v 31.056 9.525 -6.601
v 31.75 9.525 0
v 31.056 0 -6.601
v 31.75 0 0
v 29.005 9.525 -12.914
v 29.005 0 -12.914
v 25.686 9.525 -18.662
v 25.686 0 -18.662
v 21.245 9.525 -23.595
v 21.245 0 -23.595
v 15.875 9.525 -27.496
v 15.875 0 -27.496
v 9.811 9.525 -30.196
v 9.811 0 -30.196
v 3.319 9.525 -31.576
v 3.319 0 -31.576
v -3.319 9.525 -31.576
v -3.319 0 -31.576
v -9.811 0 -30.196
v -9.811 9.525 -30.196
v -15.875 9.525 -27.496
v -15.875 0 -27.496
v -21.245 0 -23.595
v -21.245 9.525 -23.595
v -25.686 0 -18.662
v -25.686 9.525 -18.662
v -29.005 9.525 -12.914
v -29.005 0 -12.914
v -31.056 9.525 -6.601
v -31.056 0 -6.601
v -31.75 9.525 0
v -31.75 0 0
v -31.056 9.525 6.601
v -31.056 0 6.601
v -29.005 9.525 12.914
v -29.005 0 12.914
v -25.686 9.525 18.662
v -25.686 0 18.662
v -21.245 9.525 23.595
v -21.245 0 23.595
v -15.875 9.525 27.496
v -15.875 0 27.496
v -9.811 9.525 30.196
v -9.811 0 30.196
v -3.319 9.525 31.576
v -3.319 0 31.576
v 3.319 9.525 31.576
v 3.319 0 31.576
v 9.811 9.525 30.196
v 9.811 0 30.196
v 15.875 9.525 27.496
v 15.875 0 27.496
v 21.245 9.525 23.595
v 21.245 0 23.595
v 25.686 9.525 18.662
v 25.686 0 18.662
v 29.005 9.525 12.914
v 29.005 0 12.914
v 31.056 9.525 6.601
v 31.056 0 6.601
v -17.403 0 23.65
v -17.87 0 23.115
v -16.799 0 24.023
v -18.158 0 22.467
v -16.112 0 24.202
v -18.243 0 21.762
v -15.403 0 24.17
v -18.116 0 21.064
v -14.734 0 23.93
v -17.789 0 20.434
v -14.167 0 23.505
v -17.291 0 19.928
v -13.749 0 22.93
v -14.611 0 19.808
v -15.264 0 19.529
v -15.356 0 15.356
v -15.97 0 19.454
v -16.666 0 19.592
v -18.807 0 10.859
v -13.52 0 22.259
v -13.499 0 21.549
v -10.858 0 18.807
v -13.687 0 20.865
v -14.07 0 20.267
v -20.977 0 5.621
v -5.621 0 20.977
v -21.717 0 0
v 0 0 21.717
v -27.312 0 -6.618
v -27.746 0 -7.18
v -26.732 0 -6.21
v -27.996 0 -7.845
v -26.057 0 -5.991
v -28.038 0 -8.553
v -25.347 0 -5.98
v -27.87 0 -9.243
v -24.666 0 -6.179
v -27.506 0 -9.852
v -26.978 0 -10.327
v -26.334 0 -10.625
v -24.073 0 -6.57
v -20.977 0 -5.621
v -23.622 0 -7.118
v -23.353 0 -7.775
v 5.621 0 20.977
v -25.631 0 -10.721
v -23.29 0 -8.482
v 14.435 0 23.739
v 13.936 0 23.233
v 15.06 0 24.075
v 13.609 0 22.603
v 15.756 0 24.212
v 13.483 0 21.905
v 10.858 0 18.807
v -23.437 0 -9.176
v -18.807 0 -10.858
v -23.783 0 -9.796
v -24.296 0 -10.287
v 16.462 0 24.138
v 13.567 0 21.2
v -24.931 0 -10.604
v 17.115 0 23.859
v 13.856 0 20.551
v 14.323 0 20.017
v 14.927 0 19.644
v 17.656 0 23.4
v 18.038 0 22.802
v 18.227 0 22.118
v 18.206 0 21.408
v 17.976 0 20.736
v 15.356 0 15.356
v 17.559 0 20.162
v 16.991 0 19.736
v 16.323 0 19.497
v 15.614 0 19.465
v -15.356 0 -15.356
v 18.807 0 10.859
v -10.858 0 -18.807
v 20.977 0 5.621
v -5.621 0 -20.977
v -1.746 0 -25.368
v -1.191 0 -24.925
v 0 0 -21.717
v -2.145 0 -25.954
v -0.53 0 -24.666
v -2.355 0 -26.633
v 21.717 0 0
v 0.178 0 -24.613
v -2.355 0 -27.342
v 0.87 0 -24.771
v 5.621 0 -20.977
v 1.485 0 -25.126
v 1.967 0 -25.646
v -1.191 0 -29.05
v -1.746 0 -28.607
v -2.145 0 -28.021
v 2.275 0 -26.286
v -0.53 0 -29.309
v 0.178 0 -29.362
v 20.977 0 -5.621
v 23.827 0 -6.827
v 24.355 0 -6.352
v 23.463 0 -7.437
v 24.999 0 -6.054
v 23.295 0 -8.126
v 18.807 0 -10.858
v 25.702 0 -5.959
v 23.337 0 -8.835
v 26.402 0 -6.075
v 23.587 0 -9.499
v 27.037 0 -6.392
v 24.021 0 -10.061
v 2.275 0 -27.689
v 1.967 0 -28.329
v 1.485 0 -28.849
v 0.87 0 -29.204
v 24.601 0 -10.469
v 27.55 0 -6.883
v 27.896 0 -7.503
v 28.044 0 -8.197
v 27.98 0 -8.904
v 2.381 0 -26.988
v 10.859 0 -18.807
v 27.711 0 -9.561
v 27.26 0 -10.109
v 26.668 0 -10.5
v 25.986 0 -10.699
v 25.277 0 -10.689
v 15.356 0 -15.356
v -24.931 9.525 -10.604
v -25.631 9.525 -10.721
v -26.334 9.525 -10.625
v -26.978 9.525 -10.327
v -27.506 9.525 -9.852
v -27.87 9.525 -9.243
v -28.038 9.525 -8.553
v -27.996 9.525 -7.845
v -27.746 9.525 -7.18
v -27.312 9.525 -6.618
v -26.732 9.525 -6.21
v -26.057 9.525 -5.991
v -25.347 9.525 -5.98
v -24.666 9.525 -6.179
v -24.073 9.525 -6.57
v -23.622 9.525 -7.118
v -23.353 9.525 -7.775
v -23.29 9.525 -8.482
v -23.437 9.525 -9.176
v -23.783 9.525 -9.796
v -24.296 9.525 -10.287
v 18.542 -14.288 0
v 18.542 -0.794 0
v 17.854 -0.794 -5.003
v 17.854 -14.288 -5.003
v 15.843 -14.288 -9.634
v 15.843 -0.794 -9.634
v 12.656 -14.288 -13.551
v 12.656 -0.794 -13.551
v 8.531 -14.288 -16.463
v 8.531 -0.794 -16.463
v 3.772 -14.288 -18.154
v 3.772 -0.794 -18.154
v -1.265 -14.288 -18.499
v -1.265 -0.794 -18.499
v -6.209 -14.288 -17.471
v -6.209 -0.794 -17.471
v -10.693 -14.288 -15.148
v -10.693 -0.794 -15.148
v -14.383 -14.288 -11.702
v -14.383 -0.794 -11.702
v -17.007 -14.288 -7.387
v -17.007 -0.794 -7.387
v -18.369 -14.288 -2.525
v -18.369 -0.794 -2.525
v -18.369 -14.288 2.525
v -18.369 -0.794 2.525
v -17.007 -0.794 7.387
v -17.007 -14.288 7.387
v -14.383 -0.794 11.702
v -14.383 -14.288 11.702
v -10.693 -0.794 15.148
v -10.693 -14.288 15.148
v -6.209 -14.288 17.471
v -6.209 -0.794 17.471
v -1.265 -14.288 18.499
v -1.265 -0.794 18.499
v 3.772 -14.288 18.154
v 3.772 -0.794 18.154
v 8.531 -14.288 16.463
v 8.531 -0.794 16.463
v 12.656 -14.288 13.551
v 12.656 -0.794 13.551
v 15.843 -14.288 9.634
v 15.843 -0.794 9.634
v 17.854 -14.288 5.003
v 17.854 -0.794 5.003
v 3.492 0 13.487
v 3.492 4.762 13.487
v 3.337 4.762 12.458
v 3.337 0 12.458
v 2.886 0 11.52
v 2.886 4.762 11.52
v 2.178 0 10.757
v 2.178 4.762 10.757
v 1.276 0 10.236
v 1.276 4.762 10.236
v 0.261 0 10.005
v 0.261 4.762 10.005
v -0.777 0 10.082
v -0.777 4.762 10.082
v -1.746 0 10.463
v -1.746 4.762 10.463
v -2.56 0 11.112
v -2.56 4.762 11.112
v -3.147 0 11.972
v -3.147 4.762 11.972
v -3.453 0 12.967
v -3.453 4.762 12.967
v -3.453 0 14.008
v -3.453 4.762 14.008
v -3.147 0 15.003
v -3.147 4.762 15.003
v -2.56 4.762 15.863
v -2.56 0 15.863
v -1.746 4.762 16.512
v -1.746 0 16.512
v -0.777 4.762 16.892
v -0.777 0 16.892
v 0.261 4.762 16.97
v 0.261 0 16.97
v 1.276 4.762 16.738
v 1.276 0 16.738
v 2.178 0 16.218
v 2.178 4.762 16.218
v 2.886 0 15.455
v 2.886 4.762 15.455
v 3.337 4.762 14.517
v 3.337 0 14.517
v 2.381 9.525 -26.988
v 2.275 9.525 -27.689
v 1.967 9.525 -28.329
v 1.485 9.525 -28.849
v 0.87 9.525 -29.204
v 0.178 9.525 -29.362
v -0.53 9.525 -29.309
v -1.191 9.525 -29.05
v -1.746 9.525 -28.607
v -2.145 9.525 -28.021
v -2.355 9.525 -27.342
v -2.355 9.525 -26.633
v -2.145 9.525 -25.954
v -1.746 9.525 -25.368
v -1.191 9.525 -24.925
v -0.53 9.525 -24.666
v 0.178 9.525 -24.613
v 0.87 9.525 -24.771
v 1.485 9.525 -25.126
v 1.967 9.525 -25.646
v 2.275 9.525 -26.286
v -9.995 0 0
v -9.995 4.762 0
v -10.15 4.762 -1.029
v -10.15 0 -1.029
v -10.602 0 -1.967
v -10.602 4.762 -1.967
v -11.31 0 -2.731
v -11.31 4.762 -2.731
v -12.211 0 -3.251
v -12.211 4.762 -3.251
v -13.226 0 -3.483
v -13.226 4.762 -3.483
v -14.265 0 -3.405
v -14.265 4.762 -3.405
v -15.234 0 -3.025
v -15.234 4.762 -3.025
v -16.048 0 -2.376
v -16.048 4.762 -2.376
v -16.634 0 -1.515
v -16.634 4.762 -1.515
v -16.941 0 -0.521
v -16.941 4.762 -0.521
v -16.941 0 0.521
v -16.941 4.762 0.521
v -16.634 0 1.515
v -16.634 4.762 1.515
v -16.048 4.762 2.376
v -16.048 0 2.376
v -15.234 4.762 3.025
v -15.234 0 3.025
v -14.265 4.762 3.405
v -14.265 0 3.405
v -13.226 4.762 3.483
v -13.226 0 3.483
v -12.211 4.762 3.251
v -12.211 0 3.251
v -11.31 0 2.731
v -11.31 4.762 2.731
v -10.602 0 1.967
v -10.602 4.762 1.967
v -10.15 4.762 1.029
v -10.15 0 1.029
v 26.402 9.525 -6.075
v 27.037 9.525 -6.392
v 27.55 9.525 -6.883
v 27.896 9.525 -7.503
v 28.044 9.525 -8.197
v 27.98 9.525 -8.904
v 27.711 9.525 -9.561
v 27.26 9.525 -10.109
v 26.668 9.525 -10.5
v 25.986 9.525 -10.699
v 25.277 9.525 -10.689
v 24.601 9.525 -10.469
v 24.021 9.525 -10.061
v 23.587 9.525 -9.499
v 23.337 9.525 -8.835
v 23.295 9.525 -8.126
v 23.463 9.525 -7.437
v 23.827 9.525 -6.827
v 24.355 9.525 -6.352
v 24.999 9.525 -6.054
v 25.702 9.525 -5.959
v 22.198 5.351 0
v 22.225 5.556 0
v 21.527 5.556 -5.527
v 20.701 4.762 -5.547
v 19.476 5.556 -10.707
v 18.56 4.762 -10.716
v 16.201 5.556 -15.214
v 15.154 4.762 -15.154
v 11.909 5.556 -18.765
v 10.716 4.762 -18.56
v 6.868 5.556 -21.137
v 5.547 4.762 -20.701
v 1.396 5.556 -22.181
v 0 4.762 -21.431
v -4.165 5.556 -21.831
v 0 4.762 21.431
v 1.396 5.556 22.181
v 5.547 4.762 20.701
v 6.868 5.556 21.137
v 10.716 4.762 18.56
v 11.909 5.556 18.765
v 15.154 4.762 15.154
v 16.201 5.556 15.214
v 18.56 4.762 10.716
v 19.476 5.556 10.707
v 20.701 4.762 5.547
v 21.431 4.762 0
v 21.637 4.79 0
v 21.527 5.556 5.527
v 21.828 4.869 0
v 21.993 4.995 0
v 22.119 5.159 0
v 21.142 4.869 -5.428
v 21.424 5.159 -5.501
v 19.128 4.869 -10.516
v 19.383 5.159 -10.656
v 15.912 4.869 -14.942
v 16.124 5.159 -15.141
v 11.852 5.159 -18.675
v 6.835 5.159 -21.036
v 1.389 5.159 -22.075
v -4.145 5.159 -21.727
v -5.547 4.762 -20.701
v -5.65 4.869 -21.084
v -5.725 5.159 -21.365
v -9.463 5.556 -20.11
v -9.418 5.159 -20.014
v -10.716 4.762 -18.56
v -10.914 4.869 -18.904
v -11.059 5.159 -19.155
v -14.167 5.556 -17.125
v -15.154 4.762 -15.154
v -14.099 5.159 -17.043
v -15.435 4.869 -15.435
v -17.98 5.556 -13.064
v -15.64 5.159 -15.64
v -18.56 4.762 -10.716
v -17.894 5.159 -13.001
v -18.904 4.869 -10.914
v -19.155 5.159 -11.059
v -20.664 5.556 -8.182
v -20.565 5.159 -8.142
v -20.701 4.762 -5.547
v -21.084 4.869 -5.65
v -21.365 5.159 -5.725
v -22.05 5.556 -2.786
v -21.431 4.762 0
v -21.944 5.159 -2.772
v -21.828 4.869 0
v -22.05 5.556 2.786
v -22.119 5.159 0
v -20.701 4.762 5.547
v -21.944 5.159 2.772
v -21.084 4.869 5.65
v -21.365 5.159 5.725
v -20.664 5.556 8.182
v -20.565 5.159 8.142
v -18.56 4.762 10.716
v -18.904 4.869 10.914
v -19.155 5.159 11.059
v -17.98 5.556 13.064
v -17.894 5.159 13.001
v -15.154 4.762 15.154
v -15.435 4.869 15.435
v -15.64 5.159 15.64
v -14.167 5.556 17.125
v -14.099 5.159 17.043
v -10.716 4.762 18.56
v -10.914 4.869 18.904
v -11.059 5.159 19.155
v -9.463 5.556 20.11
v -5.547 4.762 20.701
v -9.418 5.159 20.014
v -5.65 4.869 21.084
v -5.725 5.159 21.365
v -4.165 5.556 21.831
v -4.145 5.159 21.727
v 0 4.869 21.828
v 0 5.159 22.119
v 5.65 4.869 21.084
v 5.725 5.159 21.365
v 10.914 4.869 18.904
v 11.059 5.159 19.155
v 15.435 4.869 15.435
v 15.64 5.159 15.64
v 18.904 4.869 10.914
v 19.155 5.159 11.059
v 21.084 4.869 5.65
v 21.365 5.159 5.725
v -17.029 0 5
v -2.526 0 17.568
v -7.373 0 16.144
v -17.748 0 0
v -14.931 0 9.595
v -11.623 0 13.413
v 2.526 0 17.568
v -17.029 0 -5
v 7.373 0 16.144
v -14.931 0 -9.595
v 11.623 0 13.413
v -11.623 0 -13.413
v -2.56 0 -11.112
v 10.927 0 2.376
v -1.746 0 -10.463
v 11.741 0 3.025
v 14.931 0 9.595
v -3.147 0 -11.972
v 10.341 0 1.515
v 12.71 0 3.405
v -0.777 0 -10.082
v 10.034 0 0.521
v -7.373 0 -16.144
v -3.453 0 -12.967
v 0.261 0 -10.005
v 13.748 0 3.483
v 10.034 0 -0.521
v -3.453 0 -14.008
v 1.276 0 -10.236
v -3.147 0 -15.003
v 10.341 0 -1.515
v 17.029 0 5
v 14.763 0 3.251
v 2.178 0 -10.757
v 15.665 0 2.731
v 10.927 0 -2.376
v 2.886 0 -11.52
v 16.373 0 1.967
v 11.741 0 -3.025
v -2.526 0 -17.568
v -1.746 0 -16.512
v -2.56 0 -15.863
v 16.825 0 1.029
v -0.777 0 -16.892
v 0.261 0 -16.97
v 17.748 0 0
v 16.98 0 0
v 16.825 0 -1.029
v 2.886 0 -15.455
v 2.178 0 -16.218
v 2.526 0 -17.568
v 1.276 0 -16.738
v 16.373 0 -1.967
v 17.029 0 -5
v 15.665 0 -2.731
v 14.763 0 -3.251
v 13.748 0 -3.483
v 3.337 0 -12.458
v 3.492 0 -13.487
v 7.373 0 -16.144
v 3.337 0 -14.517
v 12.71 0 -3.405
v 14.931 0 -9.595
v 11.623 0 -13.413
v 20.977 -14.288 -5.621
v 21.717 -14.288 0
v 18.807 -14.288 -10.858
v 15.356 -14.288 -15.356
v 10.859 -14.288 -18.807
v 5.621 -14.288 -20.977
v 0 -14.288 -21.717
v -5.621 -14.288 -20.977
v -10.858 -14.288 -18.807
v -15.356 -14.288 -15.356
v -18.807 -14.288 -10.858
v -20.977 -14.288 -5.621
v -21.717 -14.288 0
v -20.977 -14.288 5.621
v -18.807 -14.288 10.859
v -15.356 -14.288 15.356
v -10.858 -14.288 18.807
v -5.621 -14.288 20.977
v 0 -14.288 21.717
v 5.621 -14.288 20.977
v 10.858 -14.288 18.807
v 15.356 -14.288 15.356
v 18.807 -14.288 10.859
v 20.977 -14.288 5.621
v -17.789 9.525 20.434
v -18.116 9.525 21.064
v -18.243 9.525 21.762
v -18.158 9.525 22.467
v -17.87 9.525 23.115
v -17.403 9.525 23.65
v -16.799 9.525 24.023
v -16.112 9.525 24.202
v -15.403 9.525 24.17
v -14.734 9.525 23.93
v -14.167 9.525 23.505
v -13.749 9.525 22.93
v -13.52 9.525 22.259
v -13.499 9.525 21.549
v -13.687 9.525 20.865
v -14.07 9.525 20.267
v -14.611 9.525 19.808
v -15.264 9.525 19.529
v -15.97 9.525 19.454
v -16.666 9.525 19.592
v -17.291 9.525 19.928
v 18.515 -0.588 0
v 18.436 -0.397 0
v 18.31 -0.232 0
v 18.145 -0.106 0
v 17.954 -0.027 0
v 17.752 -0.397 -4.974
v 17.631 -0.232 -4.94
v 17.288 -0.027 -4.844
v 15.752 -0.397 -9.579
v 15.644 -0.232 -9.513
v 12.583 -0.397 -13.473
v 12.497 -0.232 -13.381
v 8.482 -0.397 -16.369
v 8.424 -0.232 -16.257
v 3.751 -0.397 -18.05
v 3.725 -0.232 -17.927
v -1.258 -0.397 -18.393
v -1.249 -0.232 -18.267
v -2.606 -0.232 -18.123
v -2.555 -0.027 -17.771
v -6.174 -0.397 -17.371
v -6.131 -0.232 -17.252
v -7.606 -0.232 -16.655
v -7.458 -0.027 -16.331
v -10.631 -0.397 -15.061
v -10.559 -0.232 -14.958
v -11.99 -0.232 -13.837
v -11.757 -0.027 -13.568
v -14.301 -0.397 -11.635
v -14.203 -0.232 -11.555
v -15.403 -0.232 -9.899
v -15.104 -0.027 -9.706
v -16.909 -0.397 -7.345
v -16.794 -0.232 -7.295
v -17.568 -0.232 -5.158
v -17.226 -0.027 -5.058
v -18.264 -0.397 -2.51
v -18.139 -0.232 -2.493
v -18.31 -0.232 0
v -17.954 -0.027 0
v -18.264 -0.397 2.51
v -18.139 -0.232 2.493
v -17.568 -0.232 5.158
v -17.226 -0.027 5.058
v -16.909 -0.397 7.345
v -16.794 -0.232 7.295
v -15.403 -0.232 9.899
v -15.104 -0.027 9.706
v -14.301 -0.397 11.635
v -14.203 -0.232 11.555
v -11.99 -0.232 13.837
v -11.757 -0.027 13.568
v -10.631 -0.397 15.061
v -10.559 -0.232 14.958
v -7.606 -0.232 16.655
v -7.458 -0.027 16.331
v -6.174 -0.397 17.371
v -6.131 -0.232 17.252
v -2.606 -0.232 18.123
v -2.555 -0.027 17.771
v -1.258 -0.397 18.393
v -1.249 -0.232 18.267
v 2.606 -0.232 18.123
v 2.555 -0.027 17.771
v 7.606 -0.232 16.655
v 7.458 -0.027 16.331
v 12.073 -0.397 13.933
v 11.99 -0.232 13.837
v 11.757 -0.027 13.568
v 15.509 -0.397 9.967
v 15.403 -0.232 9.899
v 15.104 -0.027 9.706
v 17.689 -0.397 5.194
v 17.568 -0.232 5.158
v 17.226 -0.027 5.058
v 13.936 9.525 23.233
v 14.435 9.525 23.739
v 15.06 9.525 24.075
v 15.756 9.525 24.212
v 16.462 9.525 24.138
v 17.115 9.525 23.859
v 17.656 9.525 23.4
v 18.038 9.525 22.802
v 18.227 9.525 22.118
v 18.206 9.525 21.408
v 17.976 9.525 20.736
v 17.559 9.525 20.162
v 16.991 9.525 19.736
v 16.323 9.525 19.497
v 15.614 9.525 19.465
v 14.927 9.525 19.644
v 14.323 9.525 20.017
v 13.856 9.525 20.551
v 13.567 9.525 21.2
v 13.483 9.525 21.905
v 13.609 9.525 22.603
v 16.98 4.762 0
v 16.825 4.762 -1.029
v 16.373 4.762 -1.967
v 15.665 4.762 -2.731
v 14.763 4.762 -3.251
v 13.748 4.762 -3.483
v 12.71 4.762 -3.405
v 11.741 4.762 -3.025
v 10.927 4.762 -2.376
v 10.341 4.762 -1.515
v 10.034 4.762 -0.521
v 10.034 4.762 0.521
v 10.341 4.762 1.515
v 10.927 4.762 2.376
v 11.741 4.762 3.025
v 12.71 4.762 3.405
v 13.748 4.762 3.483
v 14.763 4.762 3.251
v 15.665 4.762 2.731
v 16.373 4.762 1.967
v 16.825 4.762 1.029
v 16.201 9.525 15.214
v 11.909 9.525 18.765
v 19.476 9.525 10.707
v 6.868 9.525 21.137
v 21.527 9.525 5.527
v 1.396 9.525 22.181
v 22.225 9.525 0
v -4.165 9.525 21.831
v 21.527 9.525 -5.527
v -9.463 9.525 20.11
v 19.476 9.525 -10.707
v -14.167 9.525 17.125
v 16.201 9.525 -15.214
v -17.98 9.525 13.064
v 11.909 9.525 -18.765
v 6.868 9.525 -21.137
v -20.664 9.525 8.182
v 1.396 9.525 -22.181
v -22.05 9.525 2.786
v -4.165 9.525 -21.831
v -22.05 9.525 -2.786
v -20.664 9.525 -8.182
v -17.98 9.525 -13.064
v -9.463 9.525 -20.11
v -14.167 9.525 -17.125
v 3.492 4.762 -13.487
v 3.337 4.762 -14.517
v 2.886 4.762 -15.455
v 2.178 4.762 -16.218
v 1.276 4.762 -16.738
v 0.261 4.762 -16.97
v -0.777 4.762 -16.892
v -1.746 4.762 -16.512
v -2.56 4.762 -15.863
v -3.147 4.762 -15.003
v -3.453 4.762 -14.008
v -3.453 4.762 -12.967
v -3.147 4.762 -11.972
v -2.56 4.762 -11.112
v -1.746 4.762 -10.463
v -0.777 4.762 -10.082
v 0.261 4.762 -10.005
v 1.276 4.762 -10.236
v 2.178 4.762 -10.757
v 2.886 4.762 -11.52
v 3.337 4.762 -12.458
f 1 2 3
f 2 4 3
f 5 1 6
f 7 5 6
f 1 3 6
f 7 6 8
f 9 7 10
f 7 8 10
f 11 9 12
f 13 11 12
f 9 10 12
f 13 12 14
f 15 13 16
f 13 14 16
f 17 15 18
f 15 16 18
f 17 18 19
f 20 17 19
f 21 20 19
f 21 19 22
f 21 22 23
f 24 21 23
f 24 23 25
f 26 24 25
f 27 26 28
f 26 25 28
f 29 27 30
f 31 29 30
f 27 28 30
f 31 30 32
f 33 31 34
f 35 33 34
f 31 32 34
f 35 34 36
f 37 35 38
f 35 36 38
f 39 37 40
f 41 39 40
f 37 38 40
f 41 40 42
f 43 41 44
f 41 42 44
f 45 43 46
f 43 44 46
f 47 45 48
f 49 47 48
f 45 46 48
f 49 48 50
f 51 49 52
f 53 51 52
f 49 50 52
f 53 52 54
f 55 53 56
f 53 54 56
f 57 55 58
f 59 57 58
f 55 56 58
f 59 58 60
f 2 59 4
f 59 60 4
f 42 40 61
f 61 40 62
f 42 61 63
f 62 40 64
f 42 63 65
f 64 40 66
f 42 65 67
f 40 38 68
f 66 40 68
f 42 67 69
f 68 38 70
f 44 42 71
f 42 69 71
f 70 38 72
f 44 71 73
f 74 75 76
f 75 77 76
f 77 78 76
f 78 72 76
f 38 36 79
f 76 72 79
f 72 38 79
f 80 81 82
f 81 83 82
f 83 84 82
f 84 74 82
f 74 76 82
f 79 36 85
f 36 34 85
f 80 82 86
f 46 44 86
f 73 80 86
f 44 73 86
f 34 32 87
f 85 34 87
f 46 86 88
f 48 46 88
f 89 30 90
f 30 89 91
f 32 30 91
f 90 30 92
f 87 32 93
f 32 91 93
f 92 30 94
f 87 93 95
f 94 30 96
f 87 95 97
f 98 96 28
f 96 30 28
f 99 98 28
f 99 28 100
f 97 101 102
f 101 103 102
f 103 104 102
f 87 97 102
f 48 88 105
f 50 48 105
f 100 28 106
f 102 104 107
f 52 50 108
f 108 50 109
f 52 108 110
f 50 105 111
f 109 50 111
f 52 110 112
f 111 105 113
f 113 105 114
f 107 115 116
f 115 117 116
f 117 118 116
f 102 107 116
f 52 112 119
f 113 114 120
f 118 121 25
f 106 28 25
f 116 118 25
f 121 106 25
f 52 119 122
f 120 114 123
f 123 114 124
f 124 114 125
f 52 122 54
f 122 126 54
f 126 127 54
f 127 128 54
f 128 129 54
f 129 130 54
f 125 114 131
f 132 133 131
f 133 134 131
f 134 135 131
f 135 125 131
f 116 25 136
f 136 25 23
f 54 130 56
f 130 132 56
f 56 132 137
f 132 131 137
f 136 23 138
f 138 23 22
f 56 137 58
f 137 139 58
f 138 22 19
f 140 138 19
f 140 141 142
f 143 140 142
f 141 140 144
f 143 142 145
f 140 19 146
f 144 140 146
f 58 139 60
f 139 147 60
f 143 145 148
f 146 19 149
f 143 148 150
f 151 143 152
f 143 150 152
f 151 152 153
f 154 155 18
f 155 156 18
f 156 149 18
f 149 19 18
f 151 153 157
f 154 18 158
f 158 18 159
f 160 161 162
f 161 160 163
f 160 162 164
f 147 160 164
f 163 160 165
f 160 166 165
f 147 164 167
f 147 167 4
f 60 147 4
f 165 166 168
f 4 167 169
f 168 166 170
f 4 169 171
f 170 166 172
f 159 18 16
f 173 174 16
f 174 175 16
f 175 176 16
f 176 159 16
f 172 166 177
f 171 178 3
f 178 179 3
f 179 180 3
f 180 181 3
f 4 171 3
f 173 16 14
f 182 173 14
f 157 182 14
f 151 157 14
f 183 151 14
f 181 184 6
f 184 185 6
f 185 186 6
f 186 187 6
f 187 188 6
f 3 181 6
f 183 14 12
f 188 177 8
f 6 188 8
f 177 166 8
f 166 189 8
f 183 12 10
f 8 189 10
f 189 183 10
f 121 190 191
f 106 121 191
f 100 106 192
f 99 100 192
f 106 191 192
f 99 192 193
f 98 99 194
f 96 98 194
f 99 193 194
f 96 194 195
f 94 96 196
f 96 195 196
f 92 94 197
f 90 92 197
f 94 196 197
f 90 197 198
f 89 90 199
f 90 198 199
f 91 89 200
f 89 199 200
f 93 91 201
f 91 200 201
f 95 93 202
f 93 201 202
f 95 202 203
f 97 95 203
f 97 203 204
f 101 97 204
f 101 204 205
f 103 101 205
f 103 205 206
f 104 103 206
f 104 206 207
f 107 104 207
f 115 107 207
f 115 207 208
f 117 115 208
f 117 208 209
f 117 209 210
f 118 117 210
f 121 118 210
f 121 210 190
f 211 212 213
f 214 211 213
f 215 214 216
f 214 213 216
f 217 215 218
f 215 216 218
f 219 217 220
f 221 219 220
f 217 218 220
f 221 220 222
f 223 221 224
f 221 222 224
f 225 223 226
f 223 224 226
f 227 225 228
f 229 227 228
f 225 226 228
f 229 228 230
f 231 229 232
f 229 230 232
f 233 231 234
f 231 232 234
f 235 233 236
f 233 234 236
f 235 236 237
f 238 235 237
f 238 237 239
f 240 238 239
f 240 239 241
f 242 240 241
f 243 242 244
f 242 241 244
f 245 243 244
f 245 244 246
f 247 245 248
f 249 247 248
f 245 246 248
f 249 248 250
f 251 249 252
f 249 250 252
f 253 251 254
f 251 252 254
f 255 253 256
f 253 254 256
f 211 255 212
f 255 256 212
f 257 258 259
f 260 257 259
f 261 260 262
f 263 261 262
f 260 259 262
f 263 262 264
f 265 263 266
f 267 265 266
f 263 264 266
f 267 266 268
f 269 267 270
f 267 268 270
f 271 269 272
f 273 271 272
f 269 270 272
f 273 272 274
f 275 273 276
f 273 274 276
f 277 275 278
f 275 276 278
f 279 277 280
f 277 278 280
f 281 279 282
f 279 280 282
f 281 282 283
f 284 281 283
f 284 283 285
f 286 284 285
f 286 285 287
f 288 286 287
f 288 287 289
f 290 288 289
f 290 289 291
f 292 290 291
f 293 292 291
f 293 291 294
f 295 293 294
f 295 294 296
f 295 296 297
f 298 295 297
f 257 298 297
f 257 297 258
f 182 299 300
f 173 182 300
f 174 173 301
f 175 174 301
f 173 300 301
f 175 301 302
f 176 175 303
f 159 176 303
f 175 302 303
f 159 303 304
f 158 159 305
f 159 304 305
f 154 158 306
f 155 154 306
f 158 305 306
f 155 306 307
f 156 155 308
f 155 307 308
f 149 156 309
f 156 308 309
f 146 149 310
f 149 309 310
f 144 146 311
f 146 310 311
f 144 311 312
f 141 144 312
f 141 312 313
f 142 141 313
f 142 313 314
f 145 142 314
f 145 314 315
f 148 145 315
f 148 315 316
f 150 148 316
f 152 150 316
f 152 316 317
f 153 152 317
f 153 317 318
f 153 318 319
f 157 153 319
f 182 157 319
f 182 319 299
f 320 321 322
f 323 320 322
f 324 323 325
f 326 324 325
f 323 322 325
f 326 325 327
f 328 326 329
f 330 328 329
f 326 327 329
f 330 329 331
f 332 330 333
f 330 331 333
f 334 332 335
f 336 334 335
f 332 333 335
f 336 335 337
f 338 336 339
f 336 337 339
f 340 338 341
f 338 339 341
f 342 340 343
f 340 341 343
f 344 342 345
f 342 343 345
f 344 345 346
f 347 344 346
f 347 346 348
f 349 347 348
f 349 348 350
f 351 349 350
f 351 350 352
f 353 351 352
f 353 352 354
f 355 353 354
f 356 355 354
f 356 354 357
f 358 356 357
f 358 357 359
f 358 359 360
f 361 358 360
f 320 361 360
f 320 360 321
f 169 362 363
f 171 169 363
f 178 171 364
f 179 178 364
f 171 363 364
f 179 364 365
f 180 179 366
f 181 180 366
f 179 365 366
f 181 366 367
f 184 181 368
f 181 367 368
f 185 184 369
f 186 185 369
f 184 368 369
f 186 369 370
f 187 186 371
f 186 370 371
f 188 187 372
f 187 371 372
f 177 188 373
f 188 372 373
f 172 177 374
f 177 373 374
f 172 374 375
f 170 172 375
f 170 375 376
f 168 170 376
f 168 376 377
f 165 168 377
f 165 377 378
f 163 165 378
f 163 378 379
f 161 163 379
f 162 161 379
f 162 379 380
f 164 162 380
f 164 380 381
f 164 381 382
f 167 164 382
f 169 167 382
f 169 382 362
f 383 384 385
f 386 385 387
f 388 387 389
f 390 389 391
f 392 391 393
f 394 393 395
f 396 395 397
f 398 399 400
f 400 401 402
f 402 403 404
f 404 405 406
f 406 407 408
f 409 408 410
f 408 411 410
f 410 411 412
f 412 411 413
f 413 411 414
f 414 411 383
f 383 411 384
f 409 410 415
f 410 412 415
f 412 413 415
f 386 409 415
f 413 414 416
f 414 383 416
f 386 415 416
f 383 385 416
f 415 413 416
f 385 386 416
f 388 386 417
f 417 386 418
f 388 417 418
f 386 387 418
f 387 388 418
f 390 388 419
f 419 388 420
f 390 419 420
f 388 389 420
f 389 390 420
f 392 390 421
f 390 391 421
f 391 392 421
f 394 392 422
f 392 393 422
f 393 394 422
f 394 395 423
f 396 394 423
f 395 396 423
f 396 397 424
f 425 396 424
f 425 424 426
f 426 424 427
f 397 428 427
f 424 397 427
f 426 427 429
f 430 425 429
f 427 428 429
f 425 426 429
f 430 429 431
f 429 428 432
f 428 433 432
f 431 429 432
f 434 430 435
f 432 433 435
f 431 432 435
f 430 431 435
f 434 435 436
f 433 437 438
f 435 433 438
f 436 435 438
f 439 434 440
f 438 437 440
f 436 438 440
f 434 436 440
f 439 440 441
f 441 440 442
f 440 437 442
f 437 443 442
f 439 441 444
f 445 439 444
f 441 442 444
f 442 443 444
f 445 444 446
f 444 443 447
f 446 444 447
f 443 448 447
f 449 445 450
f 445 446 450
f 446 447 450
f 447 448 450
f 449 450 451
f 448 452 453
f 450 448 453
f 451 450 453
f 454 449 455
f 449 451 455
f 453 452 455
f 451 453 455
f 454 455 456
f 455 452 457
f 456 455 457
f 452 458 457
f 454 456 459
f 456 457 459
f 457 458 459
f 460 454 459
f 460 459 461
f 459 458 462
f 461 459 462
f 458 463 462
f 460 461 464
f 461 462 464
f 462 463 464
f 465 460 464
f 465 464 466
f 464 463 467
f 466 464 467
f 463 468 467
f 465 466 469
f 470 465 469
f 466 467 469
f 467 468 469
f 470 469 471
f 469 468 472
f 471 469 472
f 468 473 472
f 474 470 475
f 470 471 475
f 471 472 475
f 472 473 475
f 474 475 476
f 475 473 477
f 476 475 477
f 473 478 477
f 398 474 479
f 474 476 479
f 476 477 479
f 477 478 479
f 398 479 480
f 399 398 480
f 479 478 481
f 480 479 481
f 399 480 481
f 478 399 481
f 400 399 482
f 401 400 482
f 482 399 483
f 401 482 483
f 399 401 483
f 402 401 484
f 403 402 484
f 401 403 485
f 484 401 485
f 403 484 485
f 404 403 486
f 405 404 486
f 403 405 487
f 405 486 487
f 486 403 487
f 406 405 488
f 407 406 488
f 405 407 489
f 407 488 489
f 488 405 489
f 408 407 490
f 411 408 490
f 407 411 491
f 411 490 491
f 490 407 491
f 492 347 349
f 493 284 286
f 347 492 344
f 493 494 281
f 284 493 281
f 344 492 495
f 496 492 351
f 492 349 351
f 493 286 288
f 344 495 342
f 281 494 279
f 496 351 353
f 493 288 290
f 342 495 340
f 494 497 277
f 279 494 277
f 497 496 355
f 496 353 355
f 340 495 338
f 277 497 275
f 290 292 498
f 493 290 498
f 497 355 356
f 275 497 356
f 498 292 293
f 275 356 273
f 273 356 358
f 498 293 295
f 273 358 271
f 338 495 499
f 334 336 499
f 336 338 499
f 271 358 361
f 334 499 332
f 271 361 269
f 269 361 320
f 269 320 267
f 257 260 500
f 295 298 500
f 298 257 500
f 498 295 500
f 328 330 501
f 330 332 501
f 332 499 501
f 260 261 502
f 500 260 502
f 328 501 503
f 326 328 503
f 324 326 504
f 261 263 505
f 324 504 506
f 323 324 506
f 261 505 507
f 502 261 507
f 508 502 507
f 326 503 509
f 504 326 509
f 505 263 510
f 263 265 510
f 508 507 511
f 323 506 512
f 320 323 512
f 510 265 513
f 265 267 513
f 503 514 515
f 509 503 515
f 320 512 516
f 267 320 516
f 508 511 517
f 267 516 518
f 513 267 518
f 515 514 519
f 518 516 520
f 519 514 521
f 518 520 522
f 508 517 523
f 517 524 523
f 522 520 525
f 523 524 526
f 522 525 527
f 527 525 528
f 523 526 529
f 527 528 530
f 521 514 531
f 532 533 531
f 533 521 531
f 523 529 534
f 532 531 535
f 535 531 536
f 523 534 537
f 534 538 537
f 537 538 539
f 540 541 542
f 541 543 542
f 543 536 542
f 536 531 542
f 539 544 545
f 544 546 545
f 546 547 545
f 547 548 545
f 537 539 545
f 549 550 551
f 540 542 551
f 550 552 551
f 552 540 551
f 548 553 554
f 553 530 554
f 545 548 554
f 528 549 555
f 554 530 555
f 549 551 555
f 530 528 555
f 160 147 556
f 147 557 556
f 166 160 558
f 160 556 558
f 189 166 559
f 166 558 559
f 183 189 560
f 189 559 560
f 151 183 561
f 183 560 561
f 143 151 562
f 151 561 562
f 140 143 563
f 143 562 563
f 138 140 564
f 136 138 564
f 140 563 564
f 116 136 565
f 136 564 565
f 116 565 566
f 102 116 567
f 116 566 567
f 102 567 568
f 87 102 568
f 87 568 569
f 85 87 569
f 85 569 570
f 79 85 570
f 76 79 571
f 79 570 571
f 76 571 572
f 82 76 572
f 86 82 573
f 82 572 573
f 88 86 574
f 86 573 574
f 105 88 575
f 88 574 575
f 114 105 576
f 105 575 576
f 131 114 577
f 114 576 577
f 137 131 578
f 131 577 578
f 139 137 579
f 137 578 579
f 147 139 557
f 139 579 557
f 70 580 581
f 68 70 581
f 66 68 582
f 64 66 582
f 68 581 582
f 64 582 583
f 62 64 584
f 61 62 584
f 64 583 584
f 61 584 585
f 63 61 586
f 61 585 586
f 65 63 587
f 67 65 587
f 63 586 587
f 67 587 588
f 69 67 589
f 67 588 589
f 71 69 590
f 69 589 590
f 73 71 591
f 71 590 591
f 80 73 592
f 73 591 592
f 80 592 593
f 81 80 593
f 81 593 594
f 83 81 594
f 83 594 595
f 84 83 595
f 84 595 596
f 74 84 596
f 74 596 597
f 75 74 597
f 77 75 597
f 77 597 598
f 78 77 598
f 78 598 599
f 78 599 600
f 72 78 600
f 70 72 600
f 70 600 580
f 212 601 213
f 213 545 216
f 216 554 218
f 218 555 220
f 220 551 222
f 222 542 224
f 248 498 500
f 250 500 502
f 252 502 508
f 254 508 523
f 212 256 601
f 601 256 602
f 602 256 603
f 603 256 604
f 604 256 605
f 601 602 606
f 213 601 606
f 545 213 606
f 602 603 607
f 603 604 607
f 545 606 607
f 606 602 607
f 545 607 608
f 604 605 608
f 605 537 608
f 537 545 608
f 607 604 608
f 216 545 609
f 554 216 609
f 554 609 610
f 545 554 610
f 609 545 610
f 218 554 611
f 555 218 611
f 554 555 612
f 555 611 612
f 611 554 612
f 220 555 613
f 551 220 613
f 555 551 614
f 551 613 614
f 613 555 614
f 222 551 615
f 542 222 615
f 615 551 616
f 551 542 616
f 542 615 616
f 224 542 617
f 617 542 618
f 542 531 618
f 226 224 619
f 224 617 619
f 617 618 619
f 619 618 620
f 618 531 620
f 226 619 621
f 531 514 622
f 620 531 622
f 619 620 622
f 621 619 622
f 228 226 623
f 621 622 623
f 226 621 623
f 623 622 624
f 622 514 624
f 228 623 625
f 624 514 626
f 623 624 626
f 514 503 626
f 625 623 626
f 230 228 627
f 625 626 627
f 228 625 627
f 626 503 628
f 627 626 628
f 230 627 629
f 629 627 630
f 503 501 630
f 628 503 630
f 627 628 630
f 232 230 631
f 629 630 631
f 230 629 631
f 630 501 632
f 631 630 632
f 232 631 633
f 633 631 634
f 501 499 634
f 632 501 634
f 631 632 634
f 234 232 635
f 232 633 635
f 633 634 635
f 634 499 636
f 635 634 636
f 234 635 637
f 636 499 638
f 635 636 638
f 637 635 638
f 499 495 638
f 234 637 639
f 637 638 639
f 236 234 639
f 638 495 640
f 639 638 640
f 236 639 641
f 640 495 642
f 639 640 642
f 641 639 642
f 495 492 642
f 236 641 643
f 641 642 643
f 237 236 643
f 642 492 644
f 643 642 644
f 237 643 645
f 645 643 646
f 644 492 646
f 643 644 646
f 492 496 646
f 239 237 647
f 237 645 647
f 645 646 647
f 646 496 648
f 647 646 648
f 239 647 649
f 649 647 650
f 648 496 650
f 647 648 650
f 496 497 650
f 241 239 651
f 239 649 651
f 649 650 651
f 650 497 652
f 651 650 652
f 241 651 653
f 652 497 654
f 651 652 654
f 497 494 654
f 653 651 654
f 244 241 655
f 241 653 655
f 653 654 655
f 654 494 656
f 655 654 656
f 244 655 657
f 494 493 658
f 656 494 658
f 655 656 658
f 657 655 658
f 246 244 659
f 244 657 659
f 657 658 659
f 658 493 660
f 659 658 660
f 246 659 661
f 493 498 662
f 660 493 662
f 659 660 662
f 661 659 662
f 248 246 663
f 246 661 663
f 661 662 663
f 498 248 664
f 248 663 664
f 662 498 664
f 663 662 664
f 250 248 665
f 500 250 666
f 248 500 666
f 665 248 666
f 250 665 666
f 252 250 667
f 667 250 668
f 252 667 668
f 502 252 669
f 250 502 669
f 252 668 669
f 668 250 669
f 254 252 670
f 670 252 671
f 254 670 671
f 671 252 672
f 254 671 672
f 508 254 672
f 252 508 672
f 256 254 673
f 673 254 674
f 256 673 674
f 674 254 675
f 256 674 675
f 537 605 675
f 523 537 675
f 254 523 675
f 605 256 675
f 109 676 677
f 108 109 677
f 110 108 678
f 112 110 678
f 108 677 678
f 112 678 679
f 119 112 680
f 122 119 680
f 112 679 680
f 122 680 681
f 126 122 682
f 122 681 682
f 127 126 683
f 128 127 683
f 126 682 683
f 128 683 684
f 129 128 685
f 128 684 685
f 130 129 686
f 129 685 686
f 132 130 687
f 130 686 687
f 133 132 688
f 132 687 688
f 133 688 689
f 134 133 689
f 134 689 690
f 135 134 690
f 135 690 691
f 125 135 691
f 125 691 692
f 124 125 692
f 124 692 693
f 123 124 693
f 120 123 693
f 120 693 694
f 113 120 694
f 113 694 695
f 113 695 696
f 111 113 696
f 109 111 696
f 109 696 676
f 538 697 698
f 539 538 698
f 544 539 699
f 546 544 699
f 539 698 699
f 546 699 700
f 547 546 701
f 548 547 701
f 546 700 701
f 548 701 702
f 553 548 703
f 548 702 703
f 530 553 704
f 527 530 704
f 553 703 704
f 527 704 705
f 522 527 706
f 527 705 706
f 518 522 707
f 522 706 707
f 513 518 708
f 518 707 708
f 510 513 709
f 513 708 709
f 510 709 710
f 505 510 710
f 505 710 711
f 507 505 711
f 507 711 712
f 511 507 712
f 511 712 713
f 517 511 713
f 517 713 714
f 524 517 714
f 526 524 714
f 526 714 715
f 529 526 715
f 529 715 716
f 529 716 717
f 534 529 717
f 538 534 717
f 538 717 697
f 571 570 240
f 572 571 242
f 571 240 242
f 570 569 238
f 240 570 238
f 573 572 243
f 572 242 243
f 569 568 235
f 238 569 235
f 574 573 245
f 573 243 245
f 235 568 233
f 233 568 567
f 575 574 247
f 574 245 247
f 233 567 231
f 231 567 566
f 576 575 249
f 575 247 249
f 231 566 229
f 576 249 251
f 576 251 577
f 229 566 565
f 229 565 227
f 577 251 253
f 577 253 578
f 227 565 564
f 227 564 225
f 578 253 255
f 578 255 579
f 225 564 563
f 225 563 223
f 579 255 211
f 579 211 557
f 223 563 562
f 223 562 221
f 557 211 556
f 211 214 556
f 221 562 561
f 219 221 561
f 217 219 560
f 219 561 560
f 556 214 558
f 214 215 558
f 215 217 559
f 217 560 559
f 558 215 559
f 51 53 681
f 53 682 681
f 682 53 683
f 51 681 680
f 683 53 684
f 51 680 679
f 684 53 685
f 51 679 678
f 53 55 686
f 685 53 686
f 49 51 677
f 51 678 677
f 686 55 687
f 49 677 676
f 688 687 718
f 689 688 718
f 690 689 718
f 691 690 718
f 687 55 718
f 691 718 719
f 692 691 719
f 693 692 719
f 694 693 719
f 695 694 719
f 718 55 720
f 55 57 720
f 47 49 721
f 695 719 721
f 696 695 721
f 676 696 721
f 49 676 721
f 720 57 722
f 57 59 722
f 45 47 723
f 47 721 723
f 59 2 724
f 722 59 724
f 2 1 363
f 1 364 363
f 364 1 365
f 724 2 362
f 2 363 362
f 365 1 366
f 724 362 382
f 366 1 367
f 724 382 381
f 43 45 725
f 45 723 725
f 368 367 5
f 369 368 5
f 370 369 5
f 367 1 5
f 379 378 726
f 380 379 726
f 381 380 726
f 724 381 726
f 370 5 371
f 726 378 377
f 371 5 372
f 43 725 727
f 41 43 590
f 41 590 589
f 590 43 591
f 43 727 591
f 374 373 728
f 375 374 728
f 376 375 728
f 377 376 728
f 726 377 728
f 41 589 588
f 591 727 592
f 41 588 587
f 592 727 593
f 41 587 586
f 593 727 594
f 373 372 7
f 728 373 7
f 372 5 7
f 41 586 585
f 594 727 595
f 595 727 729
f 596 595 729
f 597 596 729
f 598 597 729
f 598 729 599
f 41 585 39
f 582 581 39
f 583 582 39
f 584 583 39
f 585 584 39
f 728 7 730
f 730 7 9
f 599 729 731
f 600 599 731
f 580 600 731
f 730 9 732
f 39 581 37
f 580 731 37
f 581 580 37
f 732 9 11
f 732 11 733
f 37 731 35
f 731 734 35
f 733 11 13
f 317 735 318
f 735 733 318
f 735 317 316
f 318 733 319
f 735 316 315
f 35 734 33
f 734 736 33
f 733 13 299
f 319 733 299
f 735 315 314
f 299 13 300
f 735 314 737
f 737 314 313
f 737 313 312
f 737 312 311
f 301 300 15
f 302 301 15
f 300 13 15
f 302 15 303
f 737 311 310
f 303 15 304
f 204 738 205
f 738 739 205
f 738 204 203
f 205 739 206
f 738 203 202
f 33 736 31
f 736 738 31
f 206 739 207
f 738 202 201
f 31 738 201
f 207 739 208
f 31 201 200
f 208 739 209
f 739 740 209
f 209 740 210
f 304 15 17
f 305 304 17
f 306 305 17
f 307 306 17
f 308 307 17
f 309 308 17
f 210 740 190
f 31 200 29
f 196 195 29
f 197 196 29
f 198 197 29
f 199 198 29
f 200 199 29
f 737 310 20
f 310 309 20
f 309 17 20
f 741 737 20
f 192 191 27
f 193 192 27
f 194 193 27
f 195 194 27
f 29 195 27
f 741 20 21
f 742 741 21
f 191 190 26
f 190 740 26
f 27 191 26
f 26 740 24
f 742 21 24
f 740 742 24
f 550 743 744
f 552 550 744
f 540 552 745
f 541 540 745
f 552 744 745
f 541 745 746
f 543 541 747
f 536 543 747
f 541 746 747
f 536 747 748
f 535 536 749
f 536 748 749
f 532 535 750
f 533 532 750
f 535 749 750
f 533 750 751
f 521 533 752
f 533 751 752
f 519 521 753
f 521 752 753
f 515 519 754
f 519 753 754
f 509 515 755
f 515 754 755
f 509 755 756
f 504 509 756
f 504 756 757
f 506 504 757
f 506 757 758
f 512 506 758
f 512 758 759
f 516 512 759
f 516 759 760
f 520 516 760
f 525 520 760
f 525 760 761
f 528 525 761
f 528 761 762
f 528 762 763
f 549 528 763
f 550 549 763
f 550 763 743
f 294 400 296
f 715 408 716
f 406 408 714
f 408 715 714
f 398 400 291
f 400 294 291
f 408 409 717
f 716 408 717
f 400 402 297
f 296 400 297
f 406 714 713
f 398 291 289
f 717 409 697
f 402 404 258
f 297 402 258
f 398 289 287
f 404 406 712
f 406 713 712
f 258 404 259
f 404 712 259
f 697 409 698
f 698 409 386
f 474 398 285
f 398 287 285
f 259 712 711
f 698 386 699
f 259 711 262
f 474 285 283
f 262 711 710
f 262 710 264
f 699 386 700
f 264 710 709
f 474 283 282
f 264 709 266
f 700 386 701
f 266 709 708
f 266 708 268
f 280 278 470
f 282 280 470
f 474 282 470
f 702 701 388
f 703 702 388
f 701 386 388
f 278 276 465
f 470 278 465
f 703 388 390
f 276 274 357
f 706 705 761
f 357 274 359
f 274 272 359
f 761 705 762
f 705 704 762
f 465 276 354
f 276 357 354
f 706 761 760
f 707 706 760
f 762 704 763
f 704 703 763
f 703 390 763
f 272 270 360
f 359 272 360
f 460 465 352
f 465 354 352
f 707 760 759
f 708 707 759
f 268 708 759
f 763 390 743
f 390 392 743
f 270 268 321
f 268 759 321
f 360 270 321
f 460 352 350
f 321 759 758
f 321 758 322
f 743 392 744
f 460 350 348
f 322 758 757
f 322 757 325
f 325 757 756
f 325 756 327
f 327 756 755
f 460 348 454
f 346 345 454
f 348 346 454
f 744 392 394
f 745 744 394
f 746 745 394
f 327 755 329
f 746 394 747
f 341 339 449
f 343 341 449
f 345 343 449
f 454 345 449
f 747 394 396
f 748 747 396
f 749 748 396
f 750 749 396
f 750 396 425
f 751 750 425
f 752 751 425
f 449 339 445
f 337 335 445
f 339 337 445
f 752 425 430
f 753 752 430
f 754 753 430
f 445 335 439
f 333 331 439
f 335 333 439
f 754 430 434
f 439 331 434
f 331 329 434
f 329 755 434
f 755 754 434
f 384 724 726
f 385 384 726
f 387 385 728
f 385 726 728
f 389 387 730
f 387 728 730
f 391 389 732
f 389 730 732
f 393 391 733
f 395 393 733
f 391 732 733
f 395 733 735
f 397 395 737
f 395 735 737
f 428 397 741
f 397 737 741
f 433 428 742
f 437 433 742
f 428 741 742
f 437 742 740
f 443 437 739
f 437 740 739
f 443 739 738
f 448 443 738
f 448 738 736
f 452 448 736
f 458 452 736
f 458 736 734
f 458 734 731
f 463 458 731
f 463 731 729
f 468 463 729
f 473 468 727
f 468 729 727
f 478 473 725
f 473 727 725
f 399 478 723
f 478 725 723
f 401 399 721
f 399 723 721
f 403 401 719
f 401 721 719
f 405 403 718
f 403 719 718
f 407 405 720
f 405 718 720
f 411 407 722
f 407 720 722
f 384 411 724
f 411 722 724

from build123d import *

# Parameters (mm, degrees)
SKETCH2_R          = 3.4925
CUT_EXTRUDE1_DEPTH = 49.775275499
SKETCH3_R          = 2.38125
CUT_EXTRUDE2_DEPTH = 51.824798635
CIRPATTERN1_COUNT  = 5
FILLET1_R          = 0.79375


with BuildPart() as part:
    # Sketch1 → Revolve1 (revolve)
    with BuildSketch(Plane.XY):
        Polygon((18.542, -14.2875), (18.542, 0), (0, 0), (0, 4.7625), (22.225, 4.7625), (22.225, 9.525), (31.75, 9.525), (31.75, 0), (21.717, 0), (21.717, -14.2875), align=None)
    revolve(axis=Axis((0, 0, 0), (0, 1, 0)))

    # Sketch2 → Cut-Extrude1 (cut, through all)
    with BuildSketch(Plane(origin=(0, 4.7625, 0), x_dir=(1, 0, 0), z_dir=(0, 1, 0))):
        with Locations((-13.4874, 0)):
            Circle(SKETCH2_R)
        with Locations((0, 13.4874)):
            Circle(SKETCH2_R)
        with Locations((13.4874, 0)):
            Circle(SKETCH2_R)
        with Locations((0, -13.4874)):
            Circle(SKETCH2_R)
    extrude(amount=-CUT_EXTRUDE1_DEPTH, mode=Mode.SUBTRACT)

    # Sketch3 → Cut-Extrude2 (cut, through all)
    with BuildSketch(Plane(origin=(0, 9.525, 0), x_dir=(1, 0, 0), z_dir=(0, 1, 0))):
        with Locations((0, 26.9875)):
            Circle(SKETCH3_R)
    cut_extrude2 = extrude(amount=-CUT_EXTRUDE2_DEPTH, mode=Mode.SUBTRACT)

    # CirPattern1: Cut-Extrude2 ×5 about axis
    cirpattern1_axis = Axis((0, 14.76375, 0), (0, -1, 0))
    for i in range(1, CIRPATTERN1_COUNT):
        add(cut_extrude2.rotate(cirpattern1_axis, i * 360 / CIRPATTERN1_COUNT), mode=Mode.SUBTRACT)

    # Fillet1
    fillet1_edges = [part.edges().sort_by_distance(p)[0] for p in [
        (-22.225, 4.7625, 0),
        (-18.542, 0, 0),
    ]]
    fillet(fillet1_edges, radius=FILLET1_R)


solid = part.part
